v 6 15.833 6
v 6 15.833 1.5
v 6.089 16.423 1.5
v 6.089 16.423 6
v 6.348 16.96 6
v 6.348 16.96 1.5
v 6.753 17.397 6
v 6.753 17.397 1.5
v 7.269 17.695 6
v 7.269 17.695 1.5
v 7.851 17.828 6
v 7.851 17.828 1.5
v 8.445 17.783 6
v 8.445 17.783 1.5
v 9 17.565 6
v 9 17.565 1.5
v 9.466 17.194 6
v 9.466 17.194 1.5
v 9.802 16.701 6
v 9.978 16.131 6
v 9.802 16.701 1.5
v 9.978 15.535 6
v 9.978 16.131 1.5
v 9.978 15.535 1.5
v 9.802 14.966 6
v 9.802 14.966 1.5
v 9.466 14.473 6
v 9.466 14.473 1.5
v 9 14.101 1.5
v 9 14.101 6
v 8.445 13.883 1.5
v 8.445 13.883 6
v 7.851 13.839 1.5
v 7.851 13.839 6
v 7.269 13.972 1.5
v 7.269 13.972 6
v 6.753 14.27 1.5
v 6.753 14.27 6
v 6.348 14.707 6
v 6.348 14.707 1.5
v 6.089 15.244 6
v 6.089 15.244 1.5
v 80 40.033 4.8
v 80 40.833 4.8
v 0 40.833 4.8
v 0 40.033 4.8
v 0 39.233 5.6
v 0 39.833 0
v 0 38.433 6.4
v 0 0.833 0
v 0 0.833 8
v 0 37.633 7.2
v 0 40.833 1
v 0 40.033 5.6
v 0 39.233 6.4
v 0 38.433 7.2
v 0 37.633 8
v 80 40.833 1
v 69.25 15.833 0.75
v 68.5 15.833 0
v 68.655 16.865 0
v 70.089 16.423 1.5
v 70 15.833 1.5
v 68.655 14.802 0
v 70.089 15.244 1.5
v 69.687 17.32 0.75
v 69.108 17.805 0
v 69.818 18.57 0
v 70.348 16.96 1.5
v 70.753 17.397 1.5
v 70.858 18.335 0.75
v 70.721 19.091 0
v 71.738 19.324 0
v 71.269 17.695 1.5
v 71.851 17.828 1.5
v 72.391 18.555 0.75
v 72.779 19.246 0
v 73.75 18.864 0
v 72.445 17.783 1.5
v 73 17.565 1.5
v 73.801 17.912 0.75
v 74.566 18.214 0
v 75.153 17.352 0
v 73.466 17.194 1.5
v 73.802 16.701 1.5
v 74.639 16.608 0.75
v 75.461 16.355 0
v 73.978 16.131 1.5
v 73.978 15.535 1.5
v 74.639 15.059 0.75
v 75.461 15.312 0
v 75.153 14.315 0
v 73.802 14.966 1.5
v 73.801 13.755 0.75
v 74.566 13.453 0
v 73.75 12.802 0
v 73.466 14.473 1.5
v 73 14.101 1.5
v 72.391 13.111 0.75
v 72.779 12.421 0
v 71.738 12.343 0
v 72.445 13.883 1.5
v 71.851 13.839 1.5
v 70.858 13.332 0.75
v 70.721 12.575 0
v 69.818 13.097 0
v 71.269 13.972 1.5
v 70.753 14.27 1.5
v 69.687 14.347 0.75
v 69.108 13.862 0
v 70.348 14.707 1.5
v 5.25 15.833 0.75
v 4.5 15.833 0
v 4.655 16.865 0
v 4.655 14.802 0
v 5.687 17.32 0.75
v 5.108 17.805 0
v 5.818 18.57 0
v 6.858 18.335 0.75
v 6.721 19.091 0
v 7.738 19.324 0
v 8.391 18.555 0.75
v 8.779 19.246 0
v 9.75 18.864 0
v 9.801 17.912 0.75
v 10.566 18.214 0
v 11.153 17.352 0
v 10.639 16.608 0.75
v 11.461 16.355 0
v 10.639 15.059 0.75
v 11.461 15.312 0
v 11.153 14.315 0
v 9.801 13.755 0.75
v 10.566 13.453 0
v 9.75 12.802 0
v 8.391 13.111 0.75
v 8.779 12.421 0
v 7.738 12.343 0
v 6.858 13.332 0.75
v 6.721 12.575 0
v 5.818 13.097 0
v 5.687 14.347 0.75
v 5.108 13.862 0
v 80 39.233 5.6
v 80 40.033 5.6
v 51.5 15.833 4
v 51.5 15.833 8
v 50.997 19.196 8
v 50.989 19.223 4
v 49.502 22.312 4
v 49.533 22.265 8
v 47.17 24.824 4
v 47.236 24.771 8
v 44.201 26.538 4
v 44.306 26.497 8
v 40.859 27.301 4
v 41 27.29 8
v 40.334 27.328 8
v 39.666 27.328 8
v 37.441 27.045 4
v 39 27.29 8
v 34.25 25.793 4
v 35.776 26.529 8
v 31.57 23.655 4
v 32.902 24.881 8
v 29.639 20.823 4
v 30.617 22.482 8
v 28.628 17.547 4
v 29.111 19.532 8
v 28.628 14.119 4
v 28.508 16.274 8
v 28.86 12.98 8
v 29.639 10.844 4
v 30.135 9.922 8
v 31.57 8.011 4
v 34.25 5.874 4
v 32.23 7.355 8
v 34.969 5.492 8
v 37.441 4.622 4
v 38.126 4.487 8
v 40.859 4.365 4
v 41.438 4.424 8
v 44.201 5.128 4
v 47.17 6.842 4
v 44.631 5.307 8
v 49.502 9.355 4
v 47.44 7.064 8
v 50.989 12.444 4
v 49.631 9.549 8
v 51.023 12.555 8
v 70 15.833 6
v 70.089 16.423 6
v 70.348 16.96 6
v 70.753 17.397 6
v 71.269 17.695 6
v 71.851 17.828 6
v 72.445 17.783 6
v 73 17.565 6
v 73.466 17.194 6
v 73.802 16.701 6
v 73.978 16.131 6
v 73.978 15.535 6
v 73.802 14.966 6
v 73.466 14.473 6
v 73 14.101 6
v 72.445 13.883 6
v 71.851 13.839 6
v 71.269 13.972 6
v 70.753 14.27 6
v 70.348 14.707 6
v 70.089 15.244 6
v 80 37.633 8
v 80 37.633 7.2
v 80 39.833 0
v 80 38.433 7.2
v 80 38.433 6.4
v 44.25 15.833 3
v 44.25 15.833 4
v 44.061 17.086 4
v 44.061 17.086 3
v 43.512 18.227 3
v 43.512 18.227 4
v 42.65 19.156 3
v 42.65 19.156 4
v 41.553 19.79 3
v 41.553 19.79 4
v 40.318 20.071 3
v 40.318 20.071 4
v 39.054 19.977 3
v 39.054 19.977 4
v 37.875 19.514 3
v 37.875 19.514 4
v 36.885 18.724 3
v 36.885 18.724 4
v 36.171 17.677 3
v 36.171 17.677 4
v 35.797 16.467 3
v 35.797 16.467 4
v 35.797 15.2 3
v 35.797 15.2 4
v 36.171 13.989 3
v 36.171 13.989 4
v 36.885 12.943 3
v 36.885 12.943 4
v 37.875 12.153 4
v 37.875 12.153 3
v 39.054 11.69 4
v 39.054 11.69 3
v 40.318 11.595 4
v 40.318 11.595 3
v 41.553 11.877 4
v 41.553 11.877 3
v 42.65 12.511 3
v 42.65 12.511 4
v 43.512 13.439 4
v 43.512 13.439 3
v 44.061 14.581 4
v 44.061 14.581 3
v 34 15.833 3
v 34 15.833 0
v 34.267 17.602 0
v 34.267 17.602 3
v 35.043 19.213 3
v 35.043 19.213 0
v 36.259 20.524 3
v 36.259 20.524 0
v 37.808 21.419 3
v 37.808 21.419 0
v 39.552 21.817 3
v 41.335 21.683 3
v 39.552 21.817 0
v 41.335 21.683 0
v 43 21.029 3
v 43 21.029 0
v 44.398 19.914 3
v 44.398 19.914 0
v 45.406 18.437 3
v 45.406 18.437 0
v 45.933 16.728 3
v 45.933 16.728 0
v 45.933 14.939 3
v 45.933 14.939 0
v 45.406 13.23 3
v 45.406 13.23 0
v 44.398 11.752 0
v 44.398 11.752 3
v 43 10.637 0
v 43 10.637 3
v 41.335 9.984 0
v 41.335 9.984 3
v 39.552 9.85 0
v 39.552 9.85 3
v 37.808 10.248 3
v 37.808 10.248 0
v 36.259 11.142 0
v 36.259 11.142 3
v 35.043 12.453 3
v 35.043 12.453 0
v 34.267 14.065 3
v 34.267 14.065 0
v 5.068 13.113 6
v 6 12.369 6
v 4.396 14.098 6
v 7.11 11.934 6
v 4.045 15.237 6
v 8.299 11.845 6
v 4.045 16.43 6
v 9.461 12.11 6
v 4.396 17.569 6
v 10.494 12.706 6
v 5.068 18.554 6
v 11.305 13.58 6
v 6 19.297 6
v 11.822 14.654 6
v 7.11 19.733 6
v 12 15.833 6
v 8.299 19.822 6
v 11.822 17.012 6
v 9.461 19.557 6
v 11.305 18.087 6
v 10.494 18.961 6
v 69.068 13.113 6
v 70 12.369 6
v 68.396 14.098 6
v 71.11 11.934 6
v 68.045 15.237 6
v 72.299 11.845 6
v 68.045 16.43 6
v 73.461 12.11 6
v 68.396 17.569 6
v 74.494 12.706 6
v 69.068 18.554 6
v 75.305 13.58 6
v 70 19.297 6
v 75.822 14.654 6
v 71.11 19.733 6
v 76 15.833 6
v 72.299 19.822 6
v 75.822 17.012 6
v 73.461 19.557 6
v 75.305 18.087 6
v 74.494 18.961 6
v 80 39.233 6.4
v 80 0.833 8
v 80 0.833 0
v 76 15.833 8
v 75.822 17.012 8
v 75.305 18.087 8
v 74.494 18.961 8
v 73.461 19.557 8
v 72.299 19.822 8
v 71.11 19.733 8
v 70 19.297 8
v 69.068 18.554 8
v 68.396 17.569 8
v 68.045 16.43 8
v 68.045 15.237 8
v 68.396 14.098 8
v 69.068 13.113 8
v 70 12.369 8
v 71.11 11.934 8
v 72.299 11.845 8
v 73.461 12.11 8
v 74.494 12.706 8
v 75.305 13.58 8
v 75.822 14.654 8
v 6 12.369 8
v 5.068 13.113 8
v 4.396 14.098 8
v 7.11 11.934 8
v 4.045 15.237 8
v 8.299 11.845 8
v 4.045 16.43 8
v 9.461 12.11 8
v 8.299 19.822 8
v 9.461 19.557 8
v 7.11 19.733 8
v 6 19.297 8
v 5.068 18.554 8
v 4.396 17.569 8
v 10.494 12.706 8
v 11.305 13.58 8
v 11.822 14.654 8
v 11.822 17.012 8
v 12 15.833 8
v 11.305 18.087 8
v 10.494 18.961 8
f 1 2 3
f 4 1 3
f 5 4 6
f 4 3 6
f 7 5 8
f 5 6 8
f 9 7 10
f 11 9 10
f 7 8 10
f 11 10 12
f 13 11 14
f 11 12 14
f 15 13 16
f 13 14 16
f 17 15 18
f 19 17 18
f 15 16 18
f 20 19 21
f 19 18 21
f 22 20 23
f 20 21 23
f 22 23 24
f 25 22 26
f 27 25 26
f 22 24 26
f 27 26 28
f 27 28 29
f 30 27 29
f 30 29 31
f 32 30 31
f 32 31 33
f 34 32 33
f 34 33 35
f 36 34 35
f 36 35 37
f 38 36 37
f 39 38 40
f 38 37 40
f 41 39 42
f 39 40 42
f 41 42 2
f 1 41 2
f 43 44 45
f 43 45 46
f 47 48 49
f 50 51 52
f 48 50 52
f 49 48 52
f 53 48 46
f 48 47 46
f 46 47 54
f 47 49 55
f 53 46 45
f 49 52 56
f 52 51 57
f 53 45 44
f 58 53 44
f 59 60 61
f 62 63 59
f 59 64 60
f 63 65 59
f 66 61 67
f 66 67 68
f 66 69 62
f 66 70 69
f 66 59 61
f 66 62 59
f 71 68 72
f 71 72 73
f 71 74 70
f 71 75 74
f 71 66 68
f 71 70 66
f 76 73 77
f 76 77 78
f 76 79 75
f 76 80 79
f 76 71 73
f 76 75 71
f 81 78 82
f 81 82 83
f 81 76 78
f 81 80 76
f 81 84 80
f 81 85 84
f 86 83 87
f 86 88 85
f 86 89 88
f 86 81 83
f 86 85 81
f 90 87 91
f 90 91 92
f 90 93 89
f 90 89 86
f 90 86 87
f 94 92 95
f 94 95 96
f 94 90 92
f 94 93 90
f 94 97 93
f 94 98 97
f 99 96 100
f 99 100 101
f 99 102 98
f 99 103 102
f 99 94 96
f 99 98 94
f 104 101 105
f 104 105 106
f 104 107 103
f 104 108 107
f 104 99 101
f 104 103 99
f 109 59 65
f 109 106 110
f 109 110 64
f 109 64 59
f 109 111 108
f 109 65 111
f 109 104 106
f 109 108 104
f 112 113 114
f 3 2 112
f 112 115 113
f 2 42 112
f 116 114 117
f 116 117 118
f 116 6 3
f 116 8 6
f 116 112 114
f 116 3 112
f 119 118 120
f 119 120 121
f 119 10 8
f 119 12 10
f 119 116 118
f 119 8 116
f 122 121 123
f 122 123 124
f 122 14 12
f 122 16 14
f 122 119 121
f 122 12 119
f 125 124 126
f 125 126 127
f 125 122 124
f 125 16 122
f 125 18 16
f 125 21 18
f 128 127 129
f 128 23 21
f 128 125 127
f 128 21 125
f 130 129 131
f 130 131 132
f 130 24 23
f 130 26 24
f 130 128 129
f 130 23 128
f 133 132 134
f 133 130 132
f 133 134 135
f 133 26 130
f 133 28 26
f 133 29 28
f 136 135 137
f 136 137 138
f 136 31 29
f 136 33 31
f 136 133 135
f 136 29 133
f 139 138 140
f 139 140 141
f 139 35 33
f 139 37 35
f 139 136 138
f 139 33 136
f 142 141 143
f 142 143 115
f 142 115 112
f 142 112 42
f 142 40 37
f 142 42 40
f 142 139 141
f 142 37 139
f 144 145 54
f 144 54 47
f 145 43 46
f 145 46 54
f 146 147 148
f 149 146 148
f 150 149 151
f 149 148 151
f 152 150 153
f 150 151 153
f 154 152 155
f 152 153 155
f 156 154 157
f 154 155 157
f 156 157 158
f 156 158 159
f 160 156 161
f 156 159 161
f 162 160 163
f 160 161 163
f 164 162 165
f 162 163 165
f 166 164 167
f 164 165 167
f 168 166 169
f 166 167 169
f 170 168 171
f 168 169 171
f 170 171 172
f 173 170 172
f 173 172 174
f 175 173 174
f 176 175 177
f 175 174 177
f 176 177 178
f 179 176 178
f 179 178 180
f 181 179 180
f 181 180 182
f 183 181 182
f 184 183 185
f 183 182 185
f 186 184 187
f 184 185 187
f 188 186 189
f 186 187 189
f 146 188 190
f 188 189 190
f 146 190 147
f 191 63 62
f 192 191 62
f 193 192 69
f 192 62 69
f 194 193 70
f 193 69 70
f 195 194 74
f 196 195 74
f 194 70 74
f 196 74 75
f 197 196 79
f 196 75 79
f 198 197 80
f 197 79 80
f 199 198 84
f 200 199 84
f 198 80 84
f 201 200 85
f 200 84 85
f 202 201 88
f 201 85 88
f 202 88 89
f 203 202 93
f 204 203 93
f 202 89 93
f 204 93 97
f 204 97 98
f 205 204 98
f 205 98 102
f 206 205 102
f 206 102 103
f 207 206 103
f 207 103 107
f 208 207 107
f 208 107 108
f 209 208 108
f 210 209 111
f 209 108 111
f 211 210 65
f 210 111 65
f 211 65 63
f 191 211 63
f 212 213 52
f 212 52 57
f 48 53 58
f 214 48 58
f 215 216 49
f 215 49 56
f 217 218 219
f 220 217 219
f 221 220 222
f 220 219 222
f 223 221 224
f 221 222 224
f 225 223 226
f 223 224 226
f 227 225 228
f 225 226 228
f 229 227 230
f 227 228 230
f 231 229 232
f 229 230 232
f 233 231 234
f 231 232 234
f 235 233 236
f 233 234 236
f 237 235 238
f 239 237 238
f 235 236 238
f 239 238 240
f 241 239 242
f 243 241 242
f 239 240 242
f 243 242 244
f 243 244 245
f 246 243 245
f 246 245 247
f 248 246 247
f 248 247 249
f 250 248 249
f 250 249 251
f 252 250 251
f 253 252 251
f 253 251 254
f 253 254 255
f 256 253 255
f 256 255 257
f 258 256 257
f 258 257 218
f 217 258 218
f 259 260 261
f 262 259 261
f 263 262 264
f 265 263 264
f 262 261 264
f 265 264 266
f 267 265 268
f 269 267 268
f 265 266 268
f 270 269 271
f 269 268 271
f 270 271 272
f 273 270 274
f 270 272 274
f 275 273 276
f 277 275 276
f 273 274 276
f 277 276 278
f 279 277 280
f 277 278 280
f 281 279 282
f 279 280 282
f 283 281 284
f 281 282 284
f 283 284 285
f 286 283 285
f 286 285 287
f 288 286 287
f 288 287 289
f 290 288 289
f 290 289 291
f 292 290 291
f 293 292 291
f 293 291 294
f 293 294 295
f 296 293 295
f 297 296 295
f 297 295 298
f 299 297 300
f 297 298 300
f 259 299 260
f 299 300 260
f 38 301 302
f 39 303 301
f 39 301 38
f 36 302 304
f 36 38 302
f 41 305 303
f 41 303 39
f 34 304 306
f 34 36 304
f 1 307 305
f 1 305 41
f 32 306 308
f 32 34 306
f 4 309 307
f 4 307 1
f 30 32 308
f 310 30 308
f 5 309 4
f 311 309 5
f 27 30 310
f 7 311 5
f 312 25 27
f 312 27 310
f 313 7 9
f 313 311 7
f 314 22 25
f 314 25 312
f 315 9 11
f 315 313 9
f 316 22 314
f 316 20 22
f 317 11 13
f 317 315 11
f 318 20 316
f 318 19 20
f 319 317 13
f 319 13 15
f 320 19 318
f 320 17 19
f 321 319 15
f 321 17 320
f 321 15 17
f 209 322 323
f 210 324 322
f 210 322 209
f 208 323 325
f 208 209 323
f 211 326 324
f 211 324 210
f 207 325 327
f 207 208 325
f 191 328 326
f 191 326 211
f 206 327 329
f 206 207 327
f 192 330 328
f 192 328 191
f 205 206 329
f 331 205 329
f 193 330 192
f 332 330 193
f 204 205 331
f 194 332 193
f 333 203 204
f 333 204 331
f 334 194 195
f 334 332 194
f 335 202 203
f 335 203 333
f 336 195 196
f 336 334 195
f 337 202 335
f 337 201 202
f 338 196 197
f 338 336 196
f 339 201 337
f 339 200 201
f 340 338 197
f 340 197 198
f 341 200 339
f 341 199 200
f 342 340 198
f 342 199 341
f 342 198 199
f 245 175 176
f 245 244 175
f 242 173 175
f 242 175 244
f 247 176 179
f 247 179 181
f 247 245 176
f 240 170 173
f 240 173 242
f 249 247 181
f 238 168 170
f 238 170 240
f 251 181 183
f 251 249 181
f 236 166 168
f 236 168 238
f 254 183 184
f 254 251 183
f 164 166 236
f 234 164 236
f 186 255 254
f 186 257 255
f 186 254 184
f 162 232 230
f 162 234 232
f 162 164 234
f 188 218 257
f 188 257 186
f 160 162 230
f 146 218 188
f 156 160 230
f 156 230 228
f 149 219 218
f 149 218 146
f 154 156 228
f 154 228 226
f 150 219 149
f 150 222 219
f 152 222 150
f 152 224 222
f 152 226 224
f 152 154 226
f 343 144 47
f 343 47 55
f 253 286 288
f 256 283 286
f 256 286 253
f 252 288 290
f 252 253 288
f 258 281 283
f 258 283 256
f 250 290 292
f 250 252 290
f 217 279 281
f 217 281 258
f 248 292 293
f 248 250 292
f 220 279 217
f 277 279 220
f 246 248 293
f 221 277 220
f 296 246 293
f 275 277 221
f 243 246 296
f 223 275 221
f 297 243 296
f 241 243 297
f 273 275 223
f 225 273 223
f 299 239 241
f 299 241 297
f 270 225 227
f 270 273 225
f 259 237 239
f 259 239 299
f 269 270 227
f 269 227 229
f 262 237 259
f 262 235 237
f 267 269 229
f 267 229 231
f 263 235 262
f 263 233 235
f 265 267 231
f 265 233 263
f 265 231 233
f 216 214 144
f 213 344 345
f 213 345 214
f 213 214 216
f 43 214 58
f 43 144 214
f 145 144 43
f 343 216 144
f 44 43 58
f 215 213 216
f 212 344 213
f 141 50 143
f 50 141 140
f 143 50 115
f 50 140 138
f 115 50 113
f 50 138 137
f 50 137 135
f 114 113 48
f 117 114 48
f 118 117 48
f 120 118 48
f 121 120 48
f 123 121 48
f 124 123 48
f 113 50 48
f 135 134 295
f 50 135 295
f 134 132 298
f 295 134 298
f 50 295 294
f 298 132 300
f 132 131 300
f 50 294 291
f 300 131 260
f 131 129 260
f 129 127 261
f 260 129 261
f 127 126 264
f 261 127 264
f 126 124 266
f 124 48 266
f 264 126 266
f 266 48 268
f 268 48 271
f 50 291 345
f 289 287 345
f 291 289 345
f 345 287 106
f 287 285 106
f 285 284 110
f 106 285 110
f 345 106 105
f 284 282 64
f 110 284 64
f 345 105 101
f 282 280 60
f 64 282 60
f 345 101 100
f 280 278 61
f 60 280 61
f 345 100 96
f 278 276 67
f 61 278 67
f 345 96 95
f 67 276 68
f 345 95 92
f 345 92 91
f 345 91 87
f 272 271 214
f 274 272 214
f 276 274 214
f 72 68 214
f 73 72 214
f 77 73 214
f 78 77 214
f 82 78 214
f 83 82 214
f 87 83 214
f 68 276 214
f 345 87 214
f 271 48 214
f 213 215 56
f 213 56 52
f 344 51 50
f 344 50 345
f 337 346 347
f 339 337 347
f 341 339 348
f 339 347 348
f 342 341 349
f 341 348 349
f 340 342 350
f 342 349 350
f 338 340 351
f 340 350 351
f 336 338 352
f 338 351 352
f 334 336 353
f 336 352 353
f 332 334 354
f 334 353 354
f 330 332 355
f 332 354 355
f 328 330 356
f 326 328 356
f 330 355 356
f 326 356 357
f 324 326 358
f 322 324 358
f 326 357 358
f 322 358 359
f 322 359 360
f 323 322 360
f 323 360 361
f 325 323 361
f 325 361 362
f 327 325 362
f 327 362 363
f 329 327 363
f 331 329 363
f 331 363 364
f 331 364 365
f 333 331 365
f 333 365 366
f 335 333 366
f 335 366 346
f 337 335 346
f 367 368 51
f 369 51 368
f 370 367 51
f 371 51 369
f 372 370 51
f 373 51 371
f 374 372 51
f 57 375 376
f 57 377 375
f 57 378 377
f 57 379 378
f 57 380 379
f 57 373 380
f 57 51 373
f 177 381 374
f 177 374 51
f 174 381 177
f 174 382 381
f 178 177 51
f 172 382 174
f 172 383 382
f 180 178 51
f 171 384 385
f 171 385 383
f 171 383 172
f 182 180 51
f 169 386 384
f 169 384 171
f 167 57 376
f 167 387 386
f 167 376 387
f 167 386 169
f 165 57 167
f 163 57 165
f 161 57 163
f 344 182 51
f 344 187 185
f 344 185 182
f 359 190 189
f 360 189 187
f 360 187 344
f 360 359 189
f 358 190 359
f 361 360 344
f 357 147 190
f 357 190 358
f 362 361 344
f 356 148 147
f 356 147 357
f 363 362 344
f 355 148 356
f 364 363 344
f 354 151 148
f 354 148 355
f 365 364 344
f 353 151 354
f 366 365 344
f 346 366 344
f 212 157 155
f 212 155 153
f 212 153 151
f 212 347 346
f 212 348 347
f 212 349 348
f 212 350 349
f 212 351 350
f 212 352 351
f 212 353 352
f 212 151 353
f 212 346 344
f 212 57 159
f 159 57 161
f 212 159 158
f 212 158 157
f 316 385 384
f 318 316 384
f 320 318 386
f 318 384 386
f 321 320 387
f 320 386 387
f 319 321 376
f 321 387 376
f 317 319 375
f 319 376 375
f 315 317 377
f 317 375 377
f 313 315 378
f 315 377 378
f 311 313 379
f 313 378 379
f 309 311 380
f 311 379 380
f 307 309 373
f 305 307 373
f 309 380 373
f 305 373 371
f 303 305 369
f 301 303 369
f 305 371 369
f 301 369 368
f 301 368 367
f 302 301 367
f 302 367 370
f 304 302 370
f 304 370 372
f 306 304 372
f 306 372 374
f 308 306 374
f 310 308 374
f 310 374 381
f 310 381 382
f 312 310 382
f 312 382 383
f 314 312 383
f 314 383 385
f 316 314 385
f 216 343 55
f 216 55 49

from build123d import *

# Parameters (mm, degrees)
SKETCH_1_W                     = 80
SKETCH_1_H                     = 60
EXTRUDE_1_DEPTH                = 8
HOLE_WIZARD_M3_5_1_D           = 4
HOLE_WIZARD_M3_5_1_CBORE_D     = 8
HOLE_WIZARD_M3_5_1_CBORE_DEPTH = 2
SKETCH_14_W                    = 80
SKETCH_14_H                    = 2
SKETCH_14_W_2                  = 2
SKETCH_14_H_2                  = 16
CUT_EXTRUDE_1_DEPTH            = 1
CUT_EXTRUDE_2_REACH            = 92.174
SKETCH_15_R                    = 4.25
SKETCH_17_R                    = 11.5
CUT_EXTRUDE_4_DEPTH            = 4
SKETCH_18_R                    = 6
CUT_EXTRUDE_5_DEPTH            = 3
CHAMFER_1_SIZE                 = 1.499999999
CHAMFER_1_SIZE2                = 1.500000001
CHAMFER_2_SIZE                 = 1
SKETCH_20_W                    = 80
SKETCH_20_H                    = 6
CUT_EXTRUDE_6_DEPTH            = 1
SKETCH_21_W                    = 80
SKETCH_21_H                    = 4
CUT_EXTRUDE_7_DEPTH            = 1
SKETCH_22_W                    = 80
SKETCH_22_H                    = 2
CUT_EXTRUDE_8_DEPTH            = 1
SKETCH_23_R                    = 1
CUT_EXTRUDE_9_DEPTH            = 1
CUT_EXTRUDE_10_REACH           = 92.174
SKETCH_24_W                    = 80
SKETCH_24_H                    = 20
EXTRUDE_2_DEPTH                = 3
CUT_EXTRUDE_11_REACH           = 92.174


with BuildPart() as part:
    # 草图1 → 凸台-拉伸1 (new body)
    with BuildSketch(Plane.XY.offset(8)):
        with Locations((40, 10.833333333)):
            Rectangle(SKETCH_1_W, SKETCH_1_H)
    extrude(amount=-EXTRUDE_1_DEPTH)

    # M3.5 六角头机械螺钉的柱形沉头孔1 (through all)
    with Locations(Plane.XY.offset(8)):
        with Locations((8, 15.833333333), (72, 15.833333333)):
            CounterBoreHole(HOLE_WIZARD_M3_5_1_D / 2, HOLE_WIZARD_M3_5_1_CBORE_D / 2, HOLE_WIZARD_M3_5_1_CBORE_DEPTH)

    # 草图14 → 切除-拉伸1 (cut)
    with BuildSketch(Plane.XY.offset(8)):
        with Locations((40, 37.833333333)):
            Rectangle(SKETCH_14_W, SKETCH_14_H)
        Polygon((15, 40.833333333), (31, 24.833333333), (32.414213562, 26.247546896), (16.414213562, 42.247546896), align=None)
        with Locations((7, 32.833333333)):
            Rectangle(SKETCH_14_W_2, SKETCH_14_H_2)
        with Locations((40, 32.833333333)):
            Rectangle(SKETCH_14_W_2, SKETCH_14_H_2)
        with Locations((73, 32.833333333)):
            Rectangle(SKETCH_14_W_2, SKETCH_14_H_2)
        Polygon((47.585786438, 26.247546896), (63.585786438, 42.247546896), (65, 40.833333333), (49, 24.833333333), align=None)
    extrude(amount=-CUT_EXTRUDE_1_DEPTH, mode=Mode.SUBTRACT)

    # 草图15 → 切除-拉伸2 (cut, up to next)
    with BuildSketch(Plane.XY.offset(8), mode=Mode.PRIVATE) as cut_extrude_2_sk1:
        with Locations((40, 15.833333333)):
            Circle(SKETCH_15_R)
    cut_extrude_2_tool1 = extrude(cut_extrude_2_sk1.sketch, amount=-CUT_EXTRUDE_2_REACH, mode=Mode.PRIVATE) & part.part
    add(cut_extrude_2_tool1.solids().sort_by_distance((40, 15.833333, 8))[0], mode=Mode.SUBTRACT)

    # 草图17 → 切除-拉伸4 (cut)
    with BuildSketch(Plane.XY.offset(8)):
        with Locations((40, 15.833333333)):
            Circle(SKETCH_17_R)
    extrude(amount=-CUT_EXTRUDE_4_DEPTH, mode=Mode.SUBTRACT)

    # 草图18 → 切除-拉伸5 (cut)
    with BuildSketch(Plane(origin=(0, 0, 0), x_dir=(-1, 0, 0), z_dir=(0, 0, -1))):
        with Locations((-40, 15.833333333)):
            Circle(SKETCH_18_R)
    extrude(amount=-CUT_EXTRUDE_5_DEPTH, mode=Mode.SUBTRACT)

    # 倒角1
    chamfer_1_edges = [part.edges().sort_by_distance(p)[0] for p in [
        (74, 15.833333333, 0),
        (10, 15.833333333, 0),
    ]]
    chamfer_1_side = [part.faces().sort_by_distance(p)[0] for p in [
        (79, 10.833333333, 0),
    ]]
    chamfer(chamfer_1_edges, length=CHAMFER_1_SIZE, length2=CHAMFER_1_SIZE2, reference=chamfer_1_side[0])

    # 倒角2
    chamfer_2_edges = [part.edges().sort_by_distance(p)[0] for p in [
        (40, 40.833333333, 0),
    ]]
    chamfer(chamfer_2_edges, length=CHAMFER_2_SIZE)

    # 草图20 → 切除-拉伸6 (cut)
    with BuildSketch(Plane.XY.offset(8)):
        with Locations((40, -16.166666667)):
            Rectangle(SKETCH_20_W, SKETCH_20_H)
    extrude(amount=-CUT_EXTRUDE_6_DEPTH, mode=Mode.SUBTRACT)

    # 草图21 → 切除-拉伸7 (cut)
    with BuildSketch(Plane.XY.offset(7)):
        with Locations((40, -17.166666667)):
            Rectangle(SKETCH_21_W, SKETCH_21_H)
    extrude(amount=-CUT_EXTRUDE_7_DEPTH, mode=Mode.SUBTRACT)

    # 草图22 → 切除-拉伸8 (cut)
    with BuildSketch(Plane.XY.offset(6)):
        with Locations((40, -18.166666667)):
            Rectangle(SKETCH_22_W, SKETCH_22_H)
    extrude(amount=-CUT_EXTRUDE_8_DEPTH, mode=Mode.SUBTRACT)

    # 草图23 → 切除-拉伸9 (cut)
    with BuildSketch(Plane.XY.offset(8)):
        with Locations((7, 24.833333333)):
            Circle(SKETCH_23_R)
        with Locations((31.707106781, 25.540440115)):
            Circle(SKETCH_23_R)
        with Locations((48.292893219, 25.540440115)):
            Circle(SKETCH_23_R)
        with Locations((73, 24.833333333)):
            Circle(SKETCH_23_R)
    extrude(amount=-CUT_EXTRUDE_9_DEPTH, mode=Mode.SUBTRACT)

    # 草图24 → 切除-拉伸10 (cut, up to next)
    with BuildSketch(Plane.XY.offset(8), mode=Mode.PRIVATE) as cut_extrude_10_sk1:
        with Locations((40, -9.166666667)):
            Rectangle(SKETCH_24_W, SKETCH_24_H)
    cut_extrude_10_tool1 = extrude(cut_extrude_10_sk1.sketch, amount=-CUT_EXTRUDE_10_REACH, mode=Mode.PRIVATE) & part.part
    add(cut_extrude_10_tool1.solids().sort_by_distance((40, -9.166667, 8))[0], mode=Mode.SUBTRACT)

    # 草图25 → 凸台-拉伸2 (add)
    with BuildSketch(Plane.XY.offset(8)):
        with BuildLine():
            Line((0, 40.833333333), (80, 40.833333333))
            Line((80, 40.833333333), (80, 22.833333333))
            Line((80, 22.833333333), (49.124143795, 22.833333333))
            ThreePointArc((49.124143795, 22.833333333), (40, 27.333333333), (30.875856205, 22.833333333))
            Line((30.875856205, 22.833333333), (0, 22.833333333))
            Line((0, 22.833333333), (0, 40.833333333))
        make_face()
    extrude(amount=-EXTRUDE_2_DEPTH)

    # 草图26 → 切除-拉伸11 (cut, up to next)
    with BuildSketch(Plane.ZY, mode=Mode.PRIVATE) as cut_extrude_11_sk1:
        Polygon((4.8, 40.833333333), (4.8, 40.033333333), (5.6, 40.033333333), (5.6, 39.233333333), (6.4, 39.233333333), (6.4, 38.433333333), (7.2, 38.433333333), (7.2, 37.633333333), (8, 37.633333333), (8, 40.833333333), align=None)
    cut_extrude_11_tool1 = extrude(cut_extrude_11_sk1.sketch, amount=-CUT_EXTRUDE_11_REACH, mode=Mode.PRIVATE) & part.part
    add(cut_extrude_11_tool1.solids().sort_by_distance((0, 39.633333, 6.8))[0], mode=Mode.SUBTRACT)


solid = part.part
